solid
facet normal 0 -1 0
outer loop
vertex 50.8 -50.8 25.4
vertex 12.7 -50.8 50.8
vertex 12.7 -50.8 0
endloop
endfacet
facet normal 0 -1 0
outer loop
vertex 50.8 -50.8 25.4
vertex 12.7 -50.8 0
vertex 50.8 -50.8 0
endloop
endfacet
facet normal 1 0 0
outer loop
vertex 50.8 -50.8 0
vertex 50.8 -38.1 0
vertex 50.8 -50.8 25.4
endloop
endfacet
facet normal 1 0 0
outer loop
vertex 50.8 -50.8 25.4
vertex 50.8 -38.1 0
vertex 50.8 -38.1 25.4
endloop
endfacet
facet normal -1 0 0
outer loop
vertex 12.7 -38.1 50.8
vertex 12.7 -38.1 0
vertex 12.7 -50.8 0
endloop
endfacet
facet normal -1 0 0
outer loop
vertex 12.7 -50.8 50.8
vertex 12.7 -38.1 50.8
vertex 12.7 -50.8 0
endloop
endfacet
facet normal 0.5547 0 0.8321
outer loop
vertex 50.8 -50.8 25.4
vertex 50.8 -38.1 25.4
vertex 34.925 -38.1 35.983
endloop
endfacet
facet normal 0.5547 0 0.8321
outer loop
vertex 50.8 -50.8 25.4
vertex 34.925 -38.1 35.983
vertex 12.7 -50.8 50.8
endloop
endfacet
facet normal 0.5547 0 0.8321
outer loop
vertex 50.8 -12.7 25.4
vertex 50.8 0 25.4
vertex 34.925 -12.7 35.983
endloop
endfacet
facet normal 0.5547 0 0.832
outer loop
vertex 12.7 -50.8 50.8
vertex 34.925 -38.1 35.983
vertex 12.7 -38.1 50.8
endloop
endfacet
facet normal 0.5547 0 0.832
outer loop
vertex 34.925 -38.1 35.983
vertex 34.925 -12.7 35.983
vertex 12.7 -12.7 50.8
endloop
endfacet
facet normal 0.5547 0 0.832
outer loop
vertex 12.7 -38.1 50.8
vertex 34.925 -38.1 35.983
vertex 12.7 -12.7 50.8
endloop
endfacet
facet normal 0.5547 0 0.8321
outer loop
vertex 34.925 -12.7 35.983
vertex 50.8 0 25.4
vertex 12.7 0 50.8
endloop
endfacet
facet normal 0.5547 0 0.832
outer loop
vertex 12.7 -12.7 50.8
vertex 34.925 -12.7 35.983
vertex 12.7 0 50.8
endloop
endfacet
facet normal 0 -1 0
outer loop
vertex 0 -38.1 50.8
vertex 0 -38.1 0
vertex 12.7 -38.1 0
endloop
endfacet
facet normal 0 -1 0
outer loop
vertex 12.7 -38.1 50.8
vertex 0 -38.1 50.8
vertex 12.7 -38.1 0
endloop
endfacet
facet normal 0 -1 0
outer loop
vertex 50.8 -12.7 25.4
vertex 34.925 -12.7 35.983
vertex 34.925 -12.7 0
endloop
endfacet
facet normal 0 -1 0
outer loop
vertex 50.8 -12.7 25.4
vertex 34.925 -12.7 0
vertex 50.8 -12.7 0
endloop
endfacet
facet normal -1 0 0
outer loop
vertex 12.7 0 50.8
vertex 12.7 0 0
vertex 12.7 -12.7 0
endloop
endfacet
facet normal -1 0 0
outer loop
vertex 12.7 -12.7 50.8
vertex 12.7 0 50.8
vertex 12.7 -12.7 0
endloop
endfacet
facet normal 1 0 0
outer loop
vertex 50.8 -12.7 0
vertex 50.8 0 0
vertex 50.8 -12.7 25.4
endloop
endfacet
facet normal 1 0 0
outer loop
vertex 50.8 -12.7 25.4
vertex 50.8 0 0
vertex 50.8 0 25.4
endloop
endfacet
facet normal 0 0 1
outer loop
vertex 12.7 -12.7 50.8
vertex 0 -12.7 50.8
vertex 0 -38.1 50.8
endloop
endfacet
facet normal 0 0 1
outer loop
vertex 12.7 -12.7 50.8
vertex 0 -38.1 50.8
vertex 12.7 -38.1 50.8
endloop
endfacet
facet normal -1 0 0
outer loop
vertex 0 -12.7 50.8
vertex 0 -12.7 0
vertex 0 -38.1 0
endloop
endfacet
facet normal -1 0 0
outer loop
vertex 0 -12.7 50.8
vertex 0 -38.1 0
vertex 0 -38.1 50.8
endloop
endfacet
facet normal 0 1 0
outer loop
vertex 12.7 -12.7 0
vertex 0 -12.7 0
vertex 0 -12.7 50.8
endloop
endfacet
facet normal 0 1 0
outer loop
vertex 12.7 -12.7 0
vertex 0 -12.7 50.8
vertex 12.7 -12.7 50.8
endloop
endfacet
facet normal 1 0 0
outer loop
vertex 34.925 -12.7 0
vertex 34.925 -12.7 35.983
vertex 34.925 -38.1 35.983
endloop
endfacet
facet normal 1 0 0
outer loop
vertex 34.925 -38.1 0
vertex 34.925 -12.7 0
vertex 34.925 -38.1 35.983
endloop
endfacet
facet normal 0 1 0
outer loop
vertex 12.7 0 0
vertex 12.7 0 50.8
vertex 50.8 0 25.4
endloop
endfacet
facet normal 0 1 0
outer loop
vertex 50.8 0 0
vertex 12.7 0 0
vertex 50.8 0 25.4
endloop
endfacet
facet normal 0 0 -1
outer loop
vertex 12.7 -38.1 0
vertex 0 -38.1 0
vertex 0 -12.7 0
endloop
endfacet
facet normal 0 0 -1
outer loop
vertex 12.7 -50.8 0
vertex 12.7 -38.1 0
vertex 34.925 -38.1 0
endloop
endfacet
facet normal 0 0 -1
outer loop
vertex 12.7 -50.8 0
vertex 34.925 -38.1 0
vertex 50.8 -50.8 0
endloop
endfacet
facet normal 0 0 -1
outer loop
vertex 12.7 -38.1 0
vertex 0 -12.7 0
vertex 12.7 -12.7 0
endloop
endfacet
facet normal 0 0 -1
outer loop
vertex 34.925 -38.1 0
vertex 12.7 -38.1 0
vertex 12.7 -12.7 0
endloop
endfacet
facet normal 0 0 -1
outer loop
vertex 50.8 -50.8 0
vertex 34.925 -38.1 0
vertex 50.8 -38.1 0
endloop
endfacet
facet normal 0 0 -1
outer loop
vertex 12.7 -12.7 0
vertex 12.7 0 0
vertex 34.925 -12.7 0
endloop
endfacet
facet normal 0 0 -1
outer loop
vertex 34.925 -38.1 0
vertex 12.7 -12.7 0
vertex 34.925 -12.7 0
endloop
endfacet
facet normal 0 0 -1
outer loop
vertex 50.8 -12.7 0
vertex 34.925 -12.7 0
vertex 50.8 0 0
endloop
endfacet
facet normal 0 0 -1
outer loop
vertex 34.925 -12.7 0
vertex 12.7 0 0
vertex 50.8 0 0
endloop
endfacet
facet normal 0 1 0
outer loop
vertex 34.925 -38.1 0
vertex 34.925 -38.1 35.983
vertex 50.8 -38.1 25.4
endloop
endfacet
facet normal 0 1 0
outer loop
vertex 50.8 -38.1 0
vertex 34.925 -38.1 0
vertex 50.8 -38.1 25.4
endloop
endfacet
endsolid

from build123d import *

# Parameters (mm, degrees)
F0_W     = 12.7
F0_H     = 50.8
F1_DEPTH = 50.8
F2_W     = 12.7
F2_H     = 12.7
F2_W_2   = 15.875
F2_H_2   = 25.4
F3_DEPTH = 50.801


with BuildPart() as f1:
    # F0 (on Front) → F1 (new body)
    with BuildSketch(Plane.XZ):
        with Locations((6.35, 25.4)):
            Rectangle(F0_W, F0_H)
        Polygon((12.7, 50.8), (12.7, 0), (50.8, 0), (50.8, 25.4), align=None)
    extrude(amount=F1_DEPTH)

    # F2 (on face) → F3 (cut, through all)
    with BuildSketch(Plane(origin=(0, 0, 0), x_dir=(1, 0, 0), z_dir=(0, 0, -1))):
        with Locations((6.35, 44.45)):
            Rectangle(F2_W, F2_H)
        with Locations((6.35, 6.35)):
            Rectangle(F2_W, F2_H)
        with Locations((42.8625, 25.4)):
            Rectangle(F2_W_2, F2_H_2)
    extrude(amount=-F3_DEPTH, mode=Mode.SUBTRACT)


solid = f1.part
